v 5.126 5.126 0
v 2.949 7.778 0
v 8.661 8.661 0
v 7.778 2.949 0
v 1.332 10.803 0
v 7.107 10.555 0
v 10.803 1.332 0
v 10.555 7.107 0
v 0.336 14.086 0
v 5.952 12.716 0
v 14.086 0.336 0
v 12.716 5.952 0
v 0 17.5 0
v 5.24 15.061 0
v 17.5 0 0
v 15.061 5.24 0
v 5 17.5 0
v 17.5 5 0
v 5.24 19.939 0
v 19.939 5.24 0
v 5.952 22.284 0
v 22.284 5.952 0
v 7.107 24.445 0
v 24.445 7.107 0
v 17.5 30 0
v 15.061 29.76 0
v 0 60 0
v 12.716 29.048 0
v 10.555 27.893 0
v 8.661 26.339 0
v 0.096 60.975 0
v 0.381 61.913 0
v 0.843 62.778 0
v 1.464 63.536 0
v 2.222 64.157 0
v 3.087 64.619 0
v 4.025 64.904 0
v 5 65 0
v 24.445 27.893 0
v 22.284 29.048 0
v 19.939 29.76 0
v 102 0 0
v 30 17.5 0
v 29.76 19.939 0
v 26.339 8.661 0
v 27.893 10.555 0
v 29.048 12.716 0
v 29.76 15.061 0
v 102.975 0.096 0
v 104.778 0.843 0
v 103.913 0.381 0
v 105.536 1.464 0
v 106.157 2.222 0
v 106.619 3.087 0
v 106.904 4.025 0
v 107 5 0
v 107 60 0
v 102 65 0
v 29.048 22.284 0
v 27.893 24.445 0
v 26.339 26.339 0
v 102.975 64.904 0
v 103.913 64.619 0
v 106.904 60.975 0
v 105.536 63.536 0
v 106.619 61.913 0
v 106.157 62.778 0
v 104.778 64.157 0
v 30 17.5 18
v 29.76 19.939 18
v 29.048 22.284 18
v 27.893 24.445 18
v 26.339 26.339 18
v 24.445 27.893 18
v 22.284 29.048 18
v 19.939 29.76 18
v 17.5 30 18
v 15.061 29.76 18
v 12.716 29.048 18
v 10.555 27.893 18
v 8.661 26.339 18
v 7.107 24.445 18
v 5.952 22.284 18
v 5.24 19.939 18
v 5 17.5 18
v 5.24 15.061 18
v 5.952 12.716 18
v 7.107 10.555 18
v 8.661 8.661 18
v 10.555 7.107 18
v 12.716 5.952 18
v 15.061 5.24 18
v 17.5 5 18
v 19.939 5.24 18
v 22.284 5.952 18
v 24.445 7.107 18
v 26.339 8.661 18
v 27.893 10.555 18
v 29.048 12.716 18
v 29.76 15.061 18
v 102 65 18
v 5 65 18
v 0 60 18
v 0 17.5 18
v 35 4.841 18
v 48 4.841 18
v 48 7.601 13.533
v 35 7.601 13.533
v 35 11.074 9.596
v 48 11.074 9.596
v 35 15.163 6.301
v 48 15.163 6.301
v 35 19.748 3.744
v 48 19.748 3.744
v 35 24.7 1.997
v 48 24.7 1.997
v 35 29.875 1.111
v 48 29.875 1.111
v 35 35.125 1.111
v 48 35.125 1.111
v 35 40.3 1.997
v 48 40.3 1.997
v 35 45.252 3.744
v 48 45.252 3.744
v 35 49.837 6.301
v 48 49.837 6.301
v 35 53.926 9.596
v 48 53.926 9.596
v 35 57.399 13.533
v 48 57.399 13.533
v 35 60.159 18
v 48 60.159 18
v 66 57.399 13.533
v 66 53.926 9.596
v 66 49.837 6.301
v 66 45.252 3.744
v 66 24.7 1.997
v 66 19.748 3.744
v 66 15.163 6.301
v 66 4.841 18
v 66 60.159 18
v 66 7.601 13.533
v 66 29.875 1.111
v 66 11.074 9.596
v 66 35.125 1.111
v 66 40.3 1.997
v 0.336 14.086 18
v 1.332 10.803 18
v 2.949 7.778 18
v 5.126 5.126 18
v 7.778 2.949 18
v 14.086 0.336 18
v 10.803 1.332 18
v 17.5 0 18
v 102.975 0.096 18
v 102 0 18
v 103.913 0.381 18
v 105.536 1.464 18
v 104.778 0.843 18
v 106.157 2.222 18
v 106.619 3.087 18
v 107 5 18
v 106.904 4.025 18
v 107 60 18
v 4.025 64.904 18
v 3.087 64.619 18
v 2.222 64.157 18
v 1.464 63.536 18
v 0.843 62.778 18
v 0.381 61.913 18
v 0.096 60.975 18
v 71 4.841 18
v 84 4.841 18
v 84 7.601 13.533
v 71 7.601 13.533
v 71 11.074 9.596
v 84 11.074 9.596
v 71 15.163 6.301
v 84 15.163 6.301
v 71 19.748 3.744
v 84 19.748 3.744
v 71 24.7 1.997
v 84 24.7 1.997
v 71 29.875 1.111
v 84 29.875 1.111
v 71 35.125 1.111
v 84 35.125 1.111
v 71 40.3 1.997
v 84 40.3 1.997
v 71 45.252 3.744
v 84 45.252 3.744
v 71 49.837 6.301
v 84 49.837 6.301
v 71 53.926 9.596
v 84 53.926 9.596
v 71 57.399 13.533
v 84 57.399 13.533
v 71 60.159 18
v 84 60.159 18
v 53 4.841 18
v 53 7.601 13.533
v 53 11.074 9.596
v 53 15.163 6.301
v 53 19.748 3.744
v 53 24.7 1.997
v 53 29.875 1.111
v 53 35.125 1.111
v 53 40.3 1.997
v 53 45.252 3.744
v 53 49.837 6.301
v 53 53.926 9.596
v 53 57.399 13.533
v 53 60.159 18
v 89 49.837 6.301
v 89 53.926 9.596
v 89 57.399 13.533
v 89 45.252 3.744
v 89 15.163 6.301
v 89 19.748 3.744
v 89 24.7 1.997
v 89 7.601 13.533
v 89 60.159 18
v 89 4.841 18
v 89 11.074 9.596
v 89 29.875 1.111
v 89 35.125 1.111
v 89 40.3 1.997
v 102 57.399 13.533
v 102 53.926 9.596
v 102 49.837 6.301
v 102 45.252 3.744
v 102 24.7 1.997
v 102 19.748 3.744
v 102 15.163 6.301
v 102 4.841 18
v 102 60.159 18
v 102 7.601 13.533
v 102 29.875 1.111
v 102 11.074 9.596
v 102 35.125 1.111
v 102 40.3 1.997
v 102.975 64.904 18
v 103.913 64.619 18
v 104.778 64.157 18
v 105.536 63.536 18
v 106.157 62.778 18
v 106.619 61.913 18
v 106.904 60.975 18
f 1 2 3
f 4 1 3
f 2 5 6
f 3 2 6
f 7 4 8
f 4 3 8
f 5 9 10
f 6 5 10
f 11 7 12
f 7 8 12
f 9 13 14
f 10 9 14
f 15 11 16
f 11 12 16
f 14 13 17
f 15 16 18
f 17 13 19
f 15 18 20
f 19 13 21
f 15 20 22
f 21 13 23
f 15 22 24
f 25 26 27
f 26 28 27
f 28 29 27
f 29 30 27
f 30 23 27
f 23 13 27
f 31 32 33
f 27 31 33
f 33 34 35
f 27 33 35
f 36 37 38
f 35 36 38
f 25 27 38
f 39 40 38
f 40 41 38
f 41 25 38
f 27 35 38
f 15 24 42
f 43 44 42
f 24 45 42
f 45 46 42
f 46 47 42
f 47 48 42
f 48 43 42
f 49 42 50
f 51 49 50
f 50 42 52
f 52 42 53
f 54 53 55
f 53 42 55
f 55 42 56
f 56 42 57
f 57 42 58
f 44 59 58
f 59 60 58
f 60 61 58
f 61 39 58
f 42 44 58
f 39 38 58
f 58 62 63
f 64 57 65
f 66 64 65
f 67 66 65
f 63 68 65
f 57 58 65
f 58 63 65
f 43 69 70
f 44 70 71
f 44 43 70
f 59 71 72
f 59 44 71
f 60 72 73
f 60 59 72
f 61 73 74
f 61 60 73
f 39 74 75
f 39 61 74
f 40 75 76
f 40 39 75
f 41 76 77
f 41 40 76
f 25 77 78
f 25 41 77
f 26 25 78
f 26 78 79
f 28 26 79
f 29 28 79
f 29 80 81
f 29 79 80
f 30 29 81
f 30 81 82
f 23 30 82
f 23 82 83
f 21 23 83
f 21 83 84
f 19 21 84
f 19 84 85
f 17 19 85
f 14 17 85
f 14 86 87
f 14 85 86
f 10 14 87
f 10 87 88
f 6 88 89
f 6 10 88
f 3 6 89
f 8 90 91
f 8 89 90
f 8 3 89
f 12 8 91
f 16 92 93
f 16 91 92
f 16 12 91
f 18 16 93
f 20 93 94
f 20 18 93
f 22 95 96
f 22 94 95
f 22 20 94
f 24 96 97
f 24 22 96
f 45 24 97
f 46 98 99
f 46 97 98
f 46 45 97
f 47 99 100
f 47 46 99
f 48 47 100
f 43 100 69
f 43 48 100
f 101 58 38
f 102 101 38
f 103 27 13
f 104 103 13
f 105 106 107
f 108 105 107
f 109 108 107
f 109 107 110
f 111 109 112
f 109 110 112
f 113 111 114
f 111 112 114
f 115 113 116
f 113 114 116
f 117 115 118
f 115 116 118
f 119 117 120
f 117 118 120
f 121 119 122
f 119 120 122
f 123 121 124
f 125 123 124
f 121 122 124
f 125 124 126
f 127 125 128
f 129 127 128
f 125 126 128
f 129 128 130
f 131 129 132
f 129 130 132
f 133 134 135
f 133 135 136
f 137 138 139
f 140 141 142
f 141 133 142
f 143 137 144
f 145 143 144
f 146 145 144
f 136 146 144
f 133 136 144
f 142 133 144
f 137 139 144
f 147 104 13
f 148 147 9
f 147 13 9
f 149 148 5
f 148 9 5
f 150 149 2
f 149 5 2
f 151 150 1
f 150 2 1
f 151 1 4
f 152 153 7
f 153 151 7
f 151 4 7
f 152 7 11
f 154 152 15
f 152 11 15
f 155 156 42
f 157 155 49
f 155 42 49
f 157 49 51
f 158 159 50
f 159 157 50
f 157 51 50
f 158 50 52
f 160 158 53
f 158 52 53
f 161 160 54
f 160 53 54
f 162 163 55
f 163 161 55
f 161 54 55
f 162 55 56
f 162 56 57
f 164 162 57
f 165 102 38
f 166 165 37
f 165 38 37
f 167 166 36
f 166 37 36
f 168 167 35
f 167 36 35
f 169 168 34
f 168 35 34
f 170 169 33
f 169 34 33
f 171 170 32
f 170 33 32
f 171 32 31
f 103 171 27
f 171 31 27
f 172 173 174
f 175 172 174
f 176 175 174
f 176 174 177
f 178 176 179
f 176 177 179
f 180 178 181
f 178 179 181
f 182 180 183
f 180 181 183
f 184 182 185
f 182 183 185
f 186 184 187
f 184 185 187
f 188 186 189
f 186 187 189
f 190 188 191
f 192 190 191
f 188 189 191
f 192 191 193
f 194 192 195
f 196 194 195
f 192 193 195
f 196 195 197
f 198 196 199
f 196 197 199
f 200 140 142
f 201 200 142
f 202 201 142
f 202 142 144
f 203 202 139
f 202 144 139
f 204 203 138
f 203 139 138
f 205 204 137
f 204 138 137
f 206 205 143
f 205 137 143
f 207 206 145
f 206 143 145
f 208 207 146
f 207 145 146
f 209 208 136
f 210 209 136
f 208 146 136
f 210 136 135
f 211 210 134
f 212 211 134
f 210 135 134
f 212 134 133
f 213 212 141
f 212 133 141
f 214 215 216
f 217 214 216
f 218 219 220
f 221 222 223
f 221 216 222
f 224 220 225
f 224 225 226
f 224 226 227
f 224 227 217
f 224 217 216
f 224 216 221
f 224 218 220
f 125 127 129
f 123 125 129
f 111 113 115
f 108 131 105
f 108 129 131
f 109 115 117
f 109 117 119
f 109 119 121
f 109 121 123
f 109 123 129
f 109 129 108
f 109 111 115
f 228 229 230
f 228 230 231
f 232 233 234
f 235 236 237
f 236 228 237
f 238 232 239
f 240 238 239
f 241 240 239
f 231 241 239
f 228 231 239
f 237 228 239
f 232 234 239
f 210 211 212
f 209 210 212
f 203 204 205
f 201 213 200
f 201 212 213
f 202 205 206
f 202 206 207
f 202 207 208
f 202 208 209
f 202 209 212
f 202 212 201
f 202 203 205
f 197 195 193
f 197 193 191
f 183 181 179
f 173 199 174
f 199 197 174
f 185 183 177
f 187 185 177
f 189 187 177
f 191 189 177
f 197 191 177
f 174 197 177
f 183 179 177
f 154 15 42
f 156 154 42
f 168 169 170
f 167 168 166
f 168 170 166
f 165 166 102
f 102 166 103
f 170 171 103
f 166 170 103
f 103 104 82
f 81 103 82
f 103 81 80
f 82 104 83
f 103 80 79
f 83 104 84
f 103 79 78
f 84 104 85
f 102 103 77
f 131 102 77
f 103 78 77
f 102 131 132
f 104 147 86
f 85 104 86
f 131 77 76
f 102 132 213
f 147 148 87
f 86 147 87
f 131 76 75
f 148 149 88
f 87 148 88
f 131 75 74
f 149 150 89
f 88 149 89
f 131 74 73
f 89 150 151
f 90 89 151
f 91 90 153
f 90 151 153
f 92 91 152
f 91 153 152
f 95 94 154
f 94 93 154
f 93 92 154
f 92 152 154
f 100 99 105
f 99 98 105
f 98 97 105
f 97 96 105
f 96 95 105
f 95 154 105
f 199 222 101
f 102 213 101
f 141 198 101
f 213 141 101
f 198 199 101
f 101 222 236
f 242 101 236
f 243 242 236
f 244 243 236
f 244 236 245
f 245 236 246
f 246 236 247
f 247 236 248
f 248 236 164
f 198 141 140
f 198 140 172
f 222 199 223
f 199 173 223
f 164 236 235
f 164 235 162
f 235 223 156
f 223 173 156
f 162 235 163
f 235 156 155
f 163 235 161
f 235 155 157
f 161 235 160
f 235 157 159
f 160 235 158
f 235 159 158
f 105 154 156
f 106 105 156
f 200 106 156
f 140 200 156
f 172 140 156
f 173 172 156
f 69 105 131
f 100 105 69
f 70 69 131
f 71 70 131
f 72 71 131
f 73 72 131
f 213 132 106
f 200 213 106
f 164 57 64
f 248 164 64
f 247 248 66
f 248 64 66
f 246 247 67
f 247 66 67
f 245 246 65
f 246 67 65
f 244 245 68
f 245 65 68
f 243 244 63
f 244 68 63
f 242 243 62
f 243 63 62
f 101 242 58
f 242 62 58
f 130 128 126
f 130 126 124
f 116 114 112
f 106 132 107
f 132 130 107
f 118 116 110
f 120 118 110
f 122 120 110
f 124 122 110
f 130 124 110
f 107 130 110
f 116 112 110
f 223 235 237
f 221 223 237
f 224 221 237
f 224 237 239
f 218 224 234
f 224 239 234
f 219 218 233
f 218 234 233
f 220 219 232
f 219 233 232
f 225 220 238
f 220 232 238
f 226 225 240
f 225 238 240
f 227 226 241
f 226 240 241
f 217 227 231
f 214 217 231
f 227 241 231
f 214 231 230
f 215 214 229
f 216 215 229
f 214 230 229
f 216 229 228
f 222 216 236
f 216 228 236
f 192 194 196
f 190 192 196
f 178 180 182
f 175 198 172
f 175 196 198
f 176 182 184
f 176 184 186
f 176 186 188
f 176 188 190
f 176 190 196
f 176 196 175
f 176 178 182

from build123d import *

# Parameters (mm, degrees)
F0_R     = 12.5
F1_DEPTH = 32
F2_W     = 13
F2_H     = 31
F4_W     = 108.9288368821
F4_H     = 18.1096374691
F5_DEPTH = 65.001


with BuildPart() as f1:
    # F0 (on Top) → F1 (new body)
    with BuildSketch(Plane.XY):
        with BuildLine():
            ThreePointArc((0, 17.5), (5.1256313292, 5.1256313292), (17.5, 0))
            Line((17.5, 0), (102, 0))
            ThreePointArc((102, 0), (105.5355339059, 1.4644660941), (107, 5))
            Line((107, 5), (107, 60))
            ThreePointArc((107, 60), (105.5355339059, 63.5355339059), (102, 65))
            Line((102, 65), (5, 65))
            ThreePointArc((5, 65), (1.4644660941, 63.5355339059), (0, 60))
            Line((0, 60), (0, 17.5))
        make_face()
        with Locations((17.5, 17.5)):
            Circle(F0_R, mode=Mode.SUBTRACT)
    extrude(amount=F1_DEPTH)

    # F2 (on face) → F3 (revolve, cut)
    with BuildSketch(Plane.XY.offset(32)):
        with Locations((41.5, 17)):
            Rectangle(F2_W, F2_H)
        with Locations((59.5, 17)):
            Rectangle(F2_W, F2_H)
        with Locations((77.5, 17)):
            Rectangle(F2_W, F2_H)
        with Locations((95.5, 17)):
            Rectangle(F2_W, F2_H)
    revolve(axis=Axis((41.5, 32.5, 32), (1, 0, 0)), mode=Mode.SUBTRACT)

    # F4 (on face) → F5 (cut, through all)
    with BuildSketch(Plane.XZ):
        with Locations((54.4644184411, 27.0548187345)):
            Rectangle(F4_W, F4_H)
    extrude(amount=-F5_DEPTH, mode=Mode.SUBTRACT)


solid = f1.part
